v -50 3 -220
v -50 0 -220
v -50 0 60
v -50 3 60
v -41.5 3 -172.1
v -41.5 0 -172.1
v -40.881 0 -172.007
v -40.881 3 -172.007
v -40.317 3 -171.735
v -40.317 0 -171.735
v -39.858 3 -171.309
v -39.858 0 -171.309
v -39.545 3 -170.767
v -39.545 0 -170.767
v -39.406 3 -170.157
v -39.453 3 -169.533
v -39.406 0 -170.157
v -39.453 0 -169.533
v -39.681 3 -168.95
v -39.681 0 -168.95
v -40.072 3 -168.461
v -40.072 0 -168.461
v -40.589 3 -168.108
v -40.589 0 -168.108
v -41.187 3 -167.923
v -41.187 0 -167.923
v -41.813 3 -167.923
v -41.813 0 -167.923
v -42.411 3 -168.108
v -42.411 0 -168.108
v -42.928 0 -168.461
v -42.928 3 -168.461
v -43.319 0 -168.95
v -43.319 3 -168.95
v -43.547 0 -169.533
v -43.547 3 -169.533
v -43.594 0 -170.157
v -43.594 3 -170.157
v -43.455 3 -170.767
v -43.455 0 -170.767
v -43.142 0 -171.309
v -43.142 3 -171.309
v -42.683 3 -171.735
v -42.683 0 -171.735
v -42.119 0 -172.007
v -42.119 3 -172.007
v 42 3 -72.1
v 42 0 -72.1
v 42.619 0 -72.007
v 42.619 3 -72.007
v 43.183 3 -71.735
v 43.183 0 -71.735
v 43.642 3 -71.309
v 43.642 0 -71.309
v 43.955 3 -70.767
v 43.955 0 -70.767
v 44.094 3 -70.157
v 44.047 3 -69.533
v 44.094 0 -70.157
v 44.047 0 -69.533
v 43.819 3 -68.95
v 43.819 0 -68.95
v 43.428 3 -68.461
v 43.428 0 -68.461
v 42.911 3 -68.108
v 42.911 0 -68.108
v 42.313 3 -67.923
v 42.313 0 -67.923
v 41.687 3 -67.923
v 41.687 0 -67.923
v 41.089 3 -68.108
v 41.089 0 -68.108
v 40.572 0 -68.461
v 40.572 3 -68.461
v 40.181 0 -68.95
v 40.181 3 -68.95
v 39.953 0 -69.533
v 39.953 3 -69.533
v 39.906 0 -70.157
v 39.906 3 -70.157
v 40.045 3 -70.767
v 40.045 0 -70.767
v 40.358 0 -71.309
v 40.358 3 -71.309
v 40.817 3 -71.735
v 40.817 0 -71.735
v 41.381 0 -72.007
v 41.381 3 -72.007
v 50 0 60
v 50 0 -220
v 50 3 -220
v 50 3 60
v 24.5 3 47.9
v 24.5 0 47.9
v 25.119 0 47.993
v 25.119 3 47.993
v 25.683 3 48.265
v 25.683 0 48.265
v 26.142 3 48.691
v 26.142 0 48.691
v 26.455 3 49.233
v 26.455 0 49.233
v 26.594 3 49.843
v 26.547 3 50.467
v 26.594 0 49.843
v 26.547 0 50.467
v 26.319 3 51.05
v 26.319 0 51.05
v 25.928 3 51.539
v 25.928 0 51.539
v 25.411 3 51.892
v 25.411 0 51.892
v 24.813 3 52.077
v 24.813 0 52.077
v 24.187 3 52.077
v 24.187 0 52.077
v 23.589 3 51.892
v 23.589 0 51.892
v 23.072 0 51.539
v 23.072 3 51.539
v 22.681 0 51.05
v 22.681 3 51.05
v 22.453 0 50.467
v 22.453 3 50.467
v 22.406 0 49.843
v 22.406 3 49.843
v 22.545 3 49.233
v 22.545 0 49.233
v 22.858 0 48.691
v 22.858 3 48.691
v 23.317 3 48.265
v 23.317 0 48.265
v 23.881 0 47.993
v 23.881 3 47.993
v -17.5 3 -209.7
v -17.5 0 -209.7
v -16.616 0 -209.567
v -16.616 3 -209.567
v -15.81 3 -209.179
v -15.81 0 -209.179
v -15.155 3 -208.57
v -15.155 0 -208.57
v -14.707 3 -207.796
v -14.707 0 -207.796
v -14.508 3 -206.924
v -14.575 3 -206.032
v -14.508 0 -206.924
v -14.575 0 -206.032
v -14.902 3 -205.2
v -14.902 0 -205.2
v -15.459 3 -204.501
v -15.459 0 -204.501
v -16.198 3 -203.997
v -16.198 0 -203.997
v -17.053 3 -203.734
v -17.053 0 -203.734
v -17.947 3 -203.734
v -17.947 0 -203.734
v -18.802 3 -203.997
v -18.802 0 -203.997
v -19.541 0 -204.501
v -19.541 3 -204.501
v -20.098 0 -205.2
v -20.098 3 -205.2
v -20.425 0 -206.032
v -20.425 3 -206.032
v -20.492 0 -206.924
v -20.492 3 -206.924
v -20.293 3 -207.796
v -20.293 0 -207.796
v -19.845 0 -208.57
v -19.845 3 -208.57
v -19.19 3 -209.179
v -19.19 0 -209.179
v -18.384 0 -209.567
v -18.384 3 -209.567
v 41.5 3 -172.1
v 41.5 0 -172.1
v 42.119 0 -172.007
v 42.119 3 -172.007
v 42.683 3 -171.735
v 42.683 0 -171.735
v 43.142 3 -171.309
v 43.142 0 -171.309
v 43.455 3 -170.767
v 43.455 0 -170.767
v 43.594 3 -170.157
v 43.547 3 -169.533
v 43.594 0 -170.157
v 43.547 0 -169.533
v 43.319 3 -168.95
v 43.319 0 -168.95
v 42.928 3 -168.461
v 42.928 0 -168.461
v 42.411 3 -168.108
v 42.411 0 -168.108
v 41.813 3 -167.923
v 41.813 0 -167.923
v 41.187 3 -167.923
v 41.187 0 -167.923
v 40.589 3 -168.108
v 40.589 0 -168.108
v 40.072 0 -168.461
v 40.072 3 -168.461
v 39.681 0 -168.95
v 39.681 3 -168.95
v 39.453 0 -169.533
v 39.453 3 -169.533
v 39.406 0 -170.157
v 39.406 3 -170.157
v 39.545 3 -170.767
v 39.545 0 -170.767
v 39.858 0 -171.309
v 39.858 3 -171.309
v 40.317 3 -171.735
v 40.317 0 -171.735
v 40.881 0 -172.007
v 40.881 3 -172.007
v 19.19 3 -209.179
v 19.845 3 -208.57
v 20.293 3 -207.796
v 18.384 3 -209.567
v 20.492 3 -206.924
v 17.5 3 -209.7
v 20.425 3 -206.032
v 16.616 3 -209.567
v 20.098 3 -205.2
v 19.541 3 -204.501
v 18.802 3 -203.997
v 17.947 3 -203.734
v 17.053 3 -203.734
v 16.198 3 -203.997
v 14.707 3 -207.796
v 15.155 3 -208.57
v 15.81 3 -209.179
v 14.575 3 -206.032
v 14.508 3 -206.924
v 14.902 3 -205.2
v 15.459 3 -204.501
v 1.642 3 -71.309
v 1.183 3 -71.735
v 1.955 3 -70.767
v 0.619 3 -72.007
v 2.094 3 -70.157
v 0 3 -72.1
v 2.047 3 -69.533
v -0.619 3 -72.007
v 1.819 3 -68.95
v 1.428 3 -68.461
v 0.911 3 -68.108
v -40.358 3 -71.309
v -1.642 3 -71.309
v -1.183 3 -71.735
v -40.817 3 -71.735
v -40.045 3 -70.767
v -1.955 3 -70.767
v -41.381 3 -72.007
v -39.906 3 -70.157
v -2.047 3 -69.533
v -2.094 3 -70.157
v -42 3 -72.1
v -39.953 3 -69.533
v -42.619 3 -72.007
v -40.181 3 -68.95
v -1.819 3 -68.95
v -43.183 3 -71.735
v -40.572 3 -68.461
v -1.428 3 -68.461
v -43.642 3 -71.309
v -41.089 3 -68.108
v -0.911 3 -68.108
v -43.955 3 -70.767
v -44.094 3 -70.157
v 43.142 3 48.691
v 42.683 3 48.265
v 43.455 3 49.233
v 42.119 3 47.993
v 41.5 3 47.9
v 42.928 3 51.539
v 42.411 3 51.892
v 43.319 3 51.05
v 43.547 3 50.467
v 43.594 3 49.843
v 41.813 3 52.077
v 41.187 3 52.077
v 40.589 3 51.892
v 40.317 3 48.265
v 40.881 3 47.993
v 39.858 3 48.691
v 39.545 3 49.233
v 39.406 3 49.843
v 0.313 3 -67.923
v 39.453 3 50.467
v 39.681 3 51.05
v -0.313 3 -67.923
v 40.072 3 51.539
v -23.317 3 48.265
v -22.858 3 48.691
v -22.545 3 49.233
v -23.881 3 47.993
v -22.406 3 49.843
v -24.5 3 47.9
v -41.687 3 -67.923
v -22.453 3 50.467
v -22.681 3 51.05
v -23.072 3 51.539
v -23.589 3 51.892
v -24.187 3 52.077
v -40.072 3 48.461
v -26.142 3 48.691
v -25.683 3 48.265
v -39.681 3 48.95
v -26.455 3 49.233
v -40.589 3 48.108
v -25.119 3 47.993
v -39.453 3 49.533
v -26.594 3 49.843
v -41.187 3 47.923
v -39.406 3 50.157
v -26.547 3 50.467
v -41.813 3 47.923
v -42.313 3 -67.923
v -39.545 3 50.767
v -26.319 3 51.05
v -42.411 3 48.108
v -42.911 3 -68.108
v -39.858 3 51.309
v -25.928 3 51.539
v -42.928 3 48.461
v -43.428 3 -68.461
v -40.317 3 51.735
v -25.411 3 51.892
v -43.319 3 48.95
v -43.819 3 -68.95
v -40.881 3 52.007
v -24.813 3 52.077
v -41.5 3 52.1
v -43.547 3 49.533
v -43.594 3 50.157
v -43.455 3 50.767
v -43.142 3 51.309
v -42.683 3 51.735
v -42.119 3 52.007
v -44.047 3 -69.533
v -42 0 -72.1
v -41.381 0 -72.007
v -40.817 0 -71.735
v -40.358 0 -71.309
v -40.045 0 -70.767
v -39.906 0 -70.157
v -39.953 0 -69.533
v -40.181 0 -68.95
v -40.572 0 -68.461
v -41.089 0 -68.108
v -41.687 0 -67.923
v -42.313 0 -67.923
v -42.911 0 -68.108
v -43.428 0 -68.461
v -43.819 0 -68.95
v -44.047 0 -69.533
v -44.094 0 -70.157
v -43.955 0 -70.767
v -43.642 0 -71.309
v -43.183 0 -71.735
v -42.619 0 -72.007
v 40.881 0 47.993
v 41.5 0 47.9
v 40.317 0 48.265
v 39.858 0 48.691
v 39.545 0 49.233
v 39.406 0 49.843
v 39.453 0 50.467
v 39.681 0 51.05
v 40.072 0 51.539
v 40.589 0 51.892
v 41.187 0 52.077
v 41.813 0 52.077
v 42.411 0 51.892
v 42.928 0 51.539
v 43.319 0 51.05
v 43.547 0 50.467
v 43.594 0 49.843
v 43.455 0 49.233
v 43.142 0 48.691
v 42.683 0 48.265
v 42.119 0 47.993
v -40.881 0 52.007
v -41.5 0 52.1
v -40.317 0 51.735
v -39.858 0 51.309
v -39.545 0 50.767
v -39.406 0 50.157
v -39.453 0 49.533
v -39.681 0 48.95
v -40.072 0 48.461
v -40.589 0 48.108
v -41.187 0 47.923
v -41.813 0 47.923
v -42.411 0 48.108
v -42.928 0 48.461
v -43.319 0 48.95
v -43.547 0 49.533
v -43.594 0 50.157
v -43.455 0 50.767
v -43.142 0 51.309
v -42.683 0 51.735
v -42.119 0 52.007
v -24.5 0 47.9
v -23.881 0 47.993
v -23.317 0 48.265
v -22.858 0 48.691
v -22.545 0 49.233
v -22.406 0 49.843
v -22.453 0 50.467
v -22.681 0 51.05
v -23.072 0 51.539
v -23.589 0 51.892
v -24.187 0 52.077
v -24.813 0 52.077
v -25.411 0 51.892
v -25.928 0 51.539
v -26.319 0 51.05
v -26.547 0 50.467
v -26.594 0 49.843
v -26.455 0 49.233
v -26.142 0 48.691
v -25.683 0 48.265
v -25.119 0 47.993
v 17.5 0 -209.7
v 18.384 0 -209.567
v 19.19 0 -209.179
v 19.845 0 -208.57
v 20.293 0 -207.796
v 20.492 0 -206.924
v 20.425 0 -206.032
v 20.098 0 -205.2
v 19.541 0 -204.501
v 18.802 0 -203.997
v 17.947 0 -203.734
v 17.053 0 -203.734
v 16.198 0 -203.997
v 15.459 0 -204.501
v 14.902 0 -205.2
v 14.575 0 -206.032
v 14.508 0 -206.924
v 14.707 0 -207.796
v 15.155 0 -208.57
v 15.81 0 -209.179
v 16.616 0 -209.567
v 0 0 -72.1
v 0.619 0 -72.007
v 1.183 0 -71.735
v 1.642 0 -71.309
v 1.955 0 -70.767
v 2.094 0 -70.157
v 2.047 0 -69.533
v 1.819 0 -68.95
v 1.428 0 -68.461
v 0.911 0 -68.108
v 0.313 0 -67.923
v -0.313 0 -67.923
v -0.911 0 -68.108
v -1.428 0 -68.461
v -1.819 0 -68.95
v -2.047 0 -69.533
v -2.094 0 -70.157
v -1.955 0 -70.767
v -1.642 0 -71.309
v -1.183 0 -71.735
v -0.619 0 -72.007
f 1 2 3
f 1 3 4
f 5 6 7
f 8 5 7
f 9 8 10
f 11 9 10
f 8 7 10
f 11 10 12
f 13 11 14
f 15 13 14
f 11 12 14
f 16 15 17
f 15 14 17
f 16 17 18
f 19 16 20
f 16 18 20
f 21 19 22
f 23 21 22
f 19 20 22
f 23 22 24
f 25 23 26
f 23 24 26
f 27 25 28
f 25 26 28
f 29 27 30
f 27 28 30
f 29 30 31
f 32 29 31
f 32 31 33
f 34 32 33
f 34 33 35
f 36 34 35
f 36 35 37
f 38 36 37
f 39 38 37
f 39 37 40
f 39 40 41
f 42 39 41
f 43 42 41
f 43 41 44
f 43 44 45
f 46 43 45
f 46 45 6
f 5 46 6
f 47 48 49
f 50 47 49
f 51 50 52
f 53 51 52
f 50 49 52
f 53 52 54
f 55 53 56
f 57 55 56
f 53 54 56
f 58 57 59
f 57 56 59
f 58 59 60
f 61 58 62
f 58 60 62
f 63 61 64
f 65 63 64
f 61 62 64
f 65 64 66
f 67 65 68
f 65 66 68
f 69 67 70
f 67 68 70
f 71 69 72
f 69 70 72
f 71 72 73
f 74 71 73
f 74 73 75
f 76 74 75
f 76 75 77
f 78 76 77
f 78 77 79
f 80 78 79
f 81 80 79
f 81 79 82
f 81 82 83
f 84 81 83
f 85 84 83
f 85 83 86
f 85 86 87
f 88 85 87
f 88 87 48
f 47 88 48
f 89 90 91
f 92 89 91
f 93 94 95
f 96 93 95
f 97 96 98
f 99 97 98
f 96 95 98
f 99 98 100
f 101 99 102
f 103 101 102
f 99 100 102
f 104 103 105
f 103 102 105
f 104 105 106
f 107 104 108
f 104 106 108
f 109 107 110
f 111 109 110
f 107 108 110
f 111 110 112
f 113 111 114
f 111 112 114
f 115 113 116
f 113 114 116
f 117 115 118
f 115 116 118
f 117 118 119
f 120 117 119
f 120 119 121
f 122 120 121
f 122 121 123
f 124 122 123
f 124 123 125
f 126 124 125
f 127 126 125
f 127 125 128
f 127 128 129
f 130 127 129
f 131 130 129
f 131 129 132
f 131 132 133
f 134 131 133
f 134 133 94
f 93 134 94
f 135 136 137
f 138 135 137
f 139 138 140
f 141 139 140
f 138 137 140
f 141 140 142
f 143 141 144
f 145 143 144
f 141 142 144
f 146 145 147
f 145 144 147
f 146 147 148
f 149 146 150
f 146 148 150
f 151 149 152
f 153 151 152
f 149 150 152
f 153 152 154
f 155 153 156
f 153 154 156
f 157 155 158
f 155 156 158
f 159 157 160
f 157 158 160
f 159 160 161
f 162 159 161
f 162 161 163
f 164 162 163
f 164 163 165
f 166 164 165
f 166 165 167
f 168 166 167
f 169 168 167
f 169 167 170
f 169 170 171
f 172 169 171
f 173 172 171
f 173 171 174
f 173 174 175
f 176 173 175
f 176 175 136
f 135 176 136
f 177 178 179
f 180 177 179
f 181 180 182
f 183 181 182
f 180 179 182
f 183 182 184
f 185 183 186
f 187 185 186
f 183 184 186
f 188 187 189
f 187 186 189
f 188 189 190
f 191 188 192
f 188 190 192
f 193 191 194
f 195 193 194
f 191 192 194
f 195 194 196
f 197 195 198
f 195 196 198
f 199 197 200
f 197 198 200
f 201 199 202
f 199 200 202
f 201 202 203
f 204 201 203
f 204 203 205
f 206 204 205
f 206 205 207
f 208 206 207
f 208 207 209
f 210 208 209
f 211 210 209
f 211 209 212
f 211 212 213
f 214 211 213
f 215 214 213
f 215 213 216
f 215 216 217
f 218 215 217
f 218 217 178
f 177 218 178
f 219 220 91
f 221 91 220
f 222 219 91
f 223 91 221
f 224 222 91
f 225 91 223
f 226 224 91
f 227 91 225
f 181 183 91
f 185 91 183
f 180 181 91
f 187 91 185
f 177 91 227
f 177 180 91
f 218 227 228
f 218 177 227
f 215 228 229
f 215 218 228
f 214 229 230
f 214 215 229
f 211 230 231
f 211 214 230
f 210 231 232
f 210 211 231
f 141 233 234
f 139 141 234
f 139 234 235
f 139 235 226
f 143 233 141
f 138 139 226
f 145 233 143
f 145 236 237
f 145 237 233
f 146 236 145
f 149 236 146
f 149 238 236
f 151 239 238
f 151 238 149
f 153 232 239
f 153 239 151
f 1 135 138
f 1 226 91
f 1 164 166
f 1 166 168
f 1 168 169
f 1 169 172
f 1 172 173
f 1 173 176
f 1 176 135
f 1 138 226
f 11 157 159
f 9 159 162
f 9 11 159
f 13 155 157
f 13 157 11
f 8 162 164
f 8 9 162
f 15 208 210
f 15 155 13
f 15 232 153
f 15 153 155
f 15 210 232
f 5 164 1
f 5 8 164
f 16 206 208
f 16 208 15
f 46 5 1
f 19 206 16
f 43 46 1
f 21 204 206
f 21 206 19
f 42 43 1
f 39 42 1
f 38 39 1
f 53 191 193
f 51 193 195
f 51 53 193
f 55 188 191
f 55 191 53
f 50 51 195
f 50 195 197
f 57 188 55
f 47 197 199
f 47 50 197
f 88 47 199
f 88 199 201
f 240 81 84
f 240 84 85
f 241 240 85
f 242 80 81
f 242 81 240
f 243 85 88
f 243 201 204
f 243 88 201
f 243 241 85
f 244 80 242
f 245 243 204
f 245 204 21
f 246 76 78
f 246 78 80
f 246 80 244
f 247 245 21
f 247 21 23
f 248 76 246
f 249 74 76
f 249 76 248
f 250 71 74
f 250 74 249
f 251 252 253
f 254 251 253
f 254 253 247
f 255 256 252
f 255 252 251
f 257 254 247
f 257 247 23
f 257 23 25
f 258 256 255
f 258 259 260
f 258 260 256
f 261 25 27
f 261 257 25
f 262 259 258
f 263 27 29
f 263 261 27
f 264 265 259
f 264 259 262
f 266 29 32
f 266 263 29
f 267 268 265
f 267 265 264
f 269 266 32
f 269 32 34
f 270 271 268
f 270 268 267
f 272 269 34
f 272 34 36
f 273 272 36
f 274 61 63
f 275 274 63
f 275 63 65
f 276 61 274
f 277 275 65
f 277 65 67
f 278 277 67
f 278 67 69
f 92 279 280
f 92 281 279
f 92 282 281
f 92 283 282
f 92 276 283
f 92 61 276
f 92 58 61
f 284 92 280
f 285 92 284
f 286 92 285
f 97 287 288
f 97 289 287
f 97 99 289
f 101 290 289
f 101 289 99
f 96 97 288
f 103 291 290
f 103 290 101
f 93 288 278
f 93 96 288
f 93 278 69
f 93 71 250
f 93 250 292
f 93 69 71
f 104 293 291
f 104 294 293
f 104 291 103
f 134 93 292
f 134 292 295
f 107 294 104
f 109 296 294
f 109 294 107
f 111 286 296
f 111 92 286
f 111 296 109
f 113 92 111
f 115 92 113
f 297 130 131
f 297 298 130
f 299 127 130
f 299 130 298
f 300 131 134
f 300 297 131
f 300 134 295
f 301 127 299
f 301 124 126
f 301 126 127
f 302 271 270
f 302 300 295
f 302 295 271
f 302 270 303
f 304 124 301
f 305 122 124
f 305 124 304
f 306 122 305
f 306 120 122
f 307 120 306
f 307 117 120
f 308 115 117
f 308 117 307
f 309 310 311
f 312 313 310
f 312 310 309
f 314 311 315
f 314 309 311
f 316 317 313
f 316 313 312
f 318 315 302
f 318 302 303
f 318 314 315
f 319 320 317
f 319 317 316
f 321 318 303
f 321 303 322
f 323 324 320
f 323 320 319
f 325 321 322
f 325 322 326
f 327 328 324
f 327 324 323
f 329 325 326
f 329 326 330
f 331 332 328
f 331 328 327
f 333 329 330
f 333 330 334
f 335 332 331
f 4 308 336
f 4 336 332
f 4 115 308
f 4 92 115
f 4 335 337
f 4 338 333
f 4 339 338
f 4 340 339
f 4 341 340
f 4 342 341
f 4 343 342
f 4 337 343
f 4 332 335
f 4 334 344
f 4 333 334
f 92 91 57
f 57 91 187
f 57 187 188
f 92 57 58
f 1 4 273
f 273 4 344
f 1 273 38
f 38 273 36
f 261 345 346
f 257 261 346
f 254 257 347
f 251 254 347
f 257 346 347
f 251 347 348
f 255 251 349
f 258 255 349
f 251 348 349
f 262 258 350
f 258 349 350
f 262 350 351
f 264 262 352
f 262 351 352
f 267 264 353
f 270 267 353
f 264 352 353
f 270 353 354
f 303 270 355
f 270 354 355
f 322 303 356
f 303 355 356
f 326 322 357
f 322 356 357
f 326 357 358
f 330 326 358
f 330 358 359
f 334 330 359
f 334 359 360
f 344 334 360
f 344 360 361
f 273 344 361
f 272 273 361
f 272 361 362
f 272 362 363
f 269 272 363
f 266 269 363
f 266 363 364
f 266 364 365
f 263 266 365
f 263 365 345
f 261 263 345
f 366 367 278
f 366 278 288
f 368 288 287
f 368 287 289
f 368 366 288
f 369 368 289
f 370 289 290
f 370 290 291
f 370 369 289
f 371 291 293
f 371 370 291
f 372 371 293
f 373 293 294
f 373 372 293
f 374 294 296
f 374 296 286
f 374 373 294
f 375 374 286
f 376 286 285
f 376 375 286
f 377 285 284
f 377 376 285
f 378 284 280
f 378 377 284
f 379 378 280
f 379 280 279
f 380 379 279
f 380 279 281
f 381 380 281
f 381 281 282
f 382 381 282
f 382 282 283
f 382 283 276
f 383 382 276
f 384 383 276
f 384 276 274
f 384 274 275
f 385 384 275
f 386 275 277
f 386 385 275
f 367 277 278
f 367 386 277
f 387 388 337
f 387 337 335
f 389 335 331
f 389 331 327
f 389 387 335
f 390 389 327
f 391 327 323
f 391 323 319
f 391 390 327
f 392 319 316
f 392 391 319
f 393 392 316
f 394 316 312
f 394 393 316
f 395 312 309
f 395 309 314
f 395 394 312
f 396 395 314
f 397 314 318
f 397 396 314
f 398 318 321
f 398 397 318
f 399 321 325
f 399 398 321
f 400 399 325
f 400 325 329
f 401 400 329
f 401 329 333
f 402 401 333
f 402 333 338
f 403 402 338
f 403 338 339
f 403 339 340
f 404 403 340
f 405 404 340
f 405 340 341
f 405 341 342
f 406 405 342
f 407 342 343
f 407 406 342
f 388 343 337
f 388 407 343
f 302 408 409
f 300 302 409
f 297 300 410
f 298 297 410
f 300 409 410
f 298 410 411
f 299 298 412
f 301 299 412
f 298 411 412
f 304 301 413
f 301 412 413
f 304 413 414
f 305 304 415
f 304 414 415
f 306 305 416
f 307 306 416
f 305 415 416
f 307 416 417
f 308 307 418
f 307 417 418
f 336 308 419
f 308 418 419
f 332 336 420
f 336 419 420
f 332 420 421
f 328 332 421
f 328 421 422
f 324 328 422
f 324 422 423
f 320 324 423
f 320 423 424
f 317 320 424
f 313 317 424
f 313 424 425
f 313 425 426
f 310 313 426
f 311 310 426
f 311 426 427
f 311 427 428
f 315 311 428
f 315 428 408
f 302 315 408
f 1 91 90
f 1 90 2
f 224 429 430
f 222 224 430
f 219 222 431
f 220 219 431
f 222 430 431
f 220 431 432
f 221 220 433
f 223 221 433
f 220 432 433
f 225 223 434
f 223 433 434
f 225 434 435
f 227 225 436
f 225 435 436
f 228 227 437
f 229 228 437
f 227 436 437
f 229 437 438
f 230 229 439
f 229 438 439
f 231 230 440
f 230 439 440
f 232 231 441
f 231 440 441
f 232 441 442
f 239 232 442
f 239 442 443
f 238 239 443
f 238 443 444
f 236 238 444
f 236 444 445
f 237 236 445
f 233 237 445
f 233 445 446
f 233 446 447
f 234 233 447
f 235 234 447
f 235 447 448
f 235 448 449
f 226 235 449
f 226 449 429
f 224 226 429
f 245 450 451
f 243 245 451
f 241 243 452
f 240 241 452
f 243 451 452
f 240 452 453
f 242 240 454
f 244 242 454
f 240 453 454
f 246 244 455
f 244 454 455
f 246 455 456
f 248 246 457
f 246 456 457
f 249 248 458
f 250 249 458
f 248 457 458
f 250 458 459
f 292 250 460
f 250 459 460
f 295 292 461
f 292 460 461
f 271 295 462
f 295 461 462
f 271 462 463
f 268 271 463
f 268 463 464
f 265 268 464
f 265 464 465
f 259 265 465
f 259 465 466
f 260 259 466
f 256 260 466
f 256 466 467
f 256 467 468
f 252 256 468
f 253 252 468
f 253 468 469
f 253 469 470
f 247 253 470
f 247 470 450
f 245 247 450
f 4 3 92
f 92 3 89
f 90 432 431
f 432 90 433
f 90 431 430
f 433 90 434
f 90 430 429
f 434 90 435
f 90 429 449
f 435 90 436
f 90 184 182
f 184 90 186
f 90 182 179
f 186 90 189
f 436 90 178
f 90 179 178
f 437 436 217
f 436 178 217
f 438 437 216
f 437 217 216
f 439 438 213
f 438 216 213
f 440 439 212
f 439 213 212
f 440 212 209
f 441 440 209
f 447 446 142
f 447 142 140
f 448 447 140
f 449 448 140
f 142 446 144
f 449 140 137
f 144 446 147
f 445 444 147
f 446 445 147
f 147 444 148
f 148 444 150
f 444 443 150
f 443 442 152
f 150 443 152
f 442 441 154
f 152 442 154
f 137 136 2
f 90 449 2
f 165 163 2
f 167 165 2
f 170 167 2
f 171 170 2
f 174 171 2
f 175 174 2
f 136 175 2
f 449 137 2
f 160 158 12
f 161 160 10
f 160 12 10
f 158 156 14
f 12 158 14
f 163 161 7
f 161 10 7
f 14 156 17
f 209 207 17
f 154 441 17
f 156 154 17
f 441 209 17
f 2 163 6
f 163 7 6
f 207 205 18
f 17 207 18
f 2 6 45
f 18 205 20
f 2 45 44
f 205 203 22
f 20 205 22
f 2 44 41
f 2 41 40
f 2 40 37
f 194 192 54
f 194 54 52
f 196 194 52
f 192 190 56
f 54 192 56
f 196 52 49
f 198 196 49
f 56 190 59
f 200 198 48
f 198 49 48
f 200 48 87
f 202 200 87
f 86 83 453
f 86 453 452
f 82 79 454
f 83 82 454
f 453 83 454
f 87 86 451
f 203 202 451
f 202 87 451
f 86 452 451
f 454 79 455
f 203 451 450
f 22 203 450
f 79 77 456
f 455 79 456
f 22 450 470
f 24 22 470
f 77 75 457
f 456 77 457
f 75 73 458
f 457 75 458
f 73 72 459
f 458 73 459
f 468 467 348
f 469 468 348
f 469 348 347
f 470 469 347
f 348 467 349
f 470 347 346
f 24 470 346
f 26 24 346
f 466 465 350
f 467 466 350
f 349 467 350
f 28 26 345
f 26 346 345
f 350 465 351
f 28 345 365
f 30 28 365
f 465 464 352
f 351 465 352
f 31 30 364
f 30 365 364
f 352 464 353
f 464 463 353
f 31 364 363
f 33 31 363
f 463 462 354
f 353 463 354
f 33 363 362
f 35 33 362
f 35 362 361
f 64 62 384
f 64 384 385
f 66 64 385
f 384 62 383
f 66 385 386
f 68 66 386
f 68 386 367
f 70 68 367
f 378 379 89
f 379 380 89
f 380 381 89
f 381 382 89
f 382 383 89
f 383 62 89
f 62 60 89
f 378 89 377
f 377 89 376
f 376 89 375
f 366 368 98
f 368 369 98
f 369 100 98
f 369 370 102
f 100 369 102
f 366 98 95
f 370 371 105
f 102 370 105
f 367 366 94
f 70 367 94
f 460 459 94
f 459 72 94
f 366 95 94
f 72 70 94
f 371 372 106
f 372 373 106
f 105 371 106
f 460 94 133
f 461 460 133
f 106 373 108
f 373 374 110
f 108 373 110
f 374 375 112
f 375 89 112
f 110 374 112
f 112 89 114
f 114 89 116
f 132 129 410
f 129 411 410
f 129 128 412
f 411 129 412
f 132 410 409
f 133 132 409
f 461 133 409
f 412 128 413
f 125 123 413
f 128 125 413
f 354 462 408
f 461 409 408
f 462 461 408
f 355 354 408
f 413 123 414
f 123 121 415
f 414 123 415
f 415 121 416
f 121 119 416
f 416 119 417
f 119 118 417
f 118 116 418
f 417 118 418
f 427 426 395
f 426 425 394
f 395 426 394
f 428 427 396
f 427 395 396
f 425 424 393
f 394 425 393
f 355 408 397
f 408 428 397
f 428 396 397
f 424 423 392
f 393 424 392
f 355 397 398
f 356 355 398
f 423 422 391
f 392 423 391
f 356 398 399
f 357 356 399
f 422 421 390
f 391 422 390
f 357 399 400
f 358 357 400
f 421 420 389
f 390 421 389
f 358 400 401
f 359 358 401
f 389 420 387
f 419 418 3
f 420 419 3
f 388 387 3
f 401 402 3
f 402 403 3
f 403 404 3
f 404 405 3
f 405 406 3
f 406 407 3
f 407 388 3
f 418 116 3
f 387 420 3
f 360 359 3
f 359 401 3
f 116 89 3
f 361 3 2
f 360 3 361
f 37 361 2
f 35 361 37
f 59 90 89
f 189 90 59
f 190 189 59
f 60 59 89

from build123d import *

# Parameters (mm, degrees)
SKETCH1_R             = 2.1
BOSS_EXTRUDE1_DEPTH   = 3
BOSS_EXTRUDE1_2_DEPTH = 3
BOSS_EXTRUDE1_3_DEPTH = 3
SKETCH1_W             = 100
SKETCH1_H             = 120
BOSS_EXTRUDE1_4_DEPTH = 3
SKETCH2_R             = 2.1
CUT_EXTRUDE1_DEPTH    = 10
SKETCH3_W             = 100
SKETCH3_H             = 3
BOSS_EXTRUDE2_DEPTH   = 160
SKETCH4_R             = 3
SKETCH4_R_2           = 2.1
CUT_EXTRUDE2_DEPTH    = 160
SKETCH5_R             = 2.1
CUT_EXTRUDE3_DEPTH    = 10


with BuildPart() as part:
    # Sketch1 → Boss-Extrude1 (new body)
    with BuildSketch(Plane(origin=(0, 0, 0), x_dir=(1, 0, 0), z_dir=(0, 1, 0))):
        with Locations(Location((-42, 70, 0), (0, 0, 270))):
            Circle(SKETCH1_R)
    extrude(amount=BOSS_EXTRUDE1_DEPTH)


with BuildPart() as body_2:
    # Sketch1 → Boss-Extrude1 2 (new body)
    with BuildSketch(Plane(origin=(0, 0, 0), x_dir=(1, 0, 0), z_dir=(0, 1, 0))):
        with Locations(Location((0, 70, 0), (0, 0, 270))):
            Circle(SKETCH1_R)
    extrude(amount=BOSS_EXTRUDE1_2_DEPTH)


with BuildPart() as body_3:
    # Sketch1 → Boss-Extrude1 3 (new body)
    with BuildSketch(Plane(origin=(0, 0, 0), x_dir=(1, 0, 0), z_dir=(0, 1, 0))):
        with Locations(Location((42, 70, 0), (0, 0, 270))):
            Circle(SKETCH1_R)
    extrude(amount=BOSS_EXTRUDE1_3_DEPTH)


with BuildPart() as body_4:
    # Sketch1 → Boss-Extrude1 4 (new body)
    with BuildSketch(Plane(origin=(0, 0, 0), x_dir=(1, 0, 0), z_dir=(0, 1, 0))):
        Rectangle(SKETCH1_W, SKETCH1_H)
        with Locations(Location((41.5, -50, 0), (0, 0, 90))):
            Circle(SKETCH1_R, mode=Mode.SUBTRACT)
        with Locations(Location((-41.5, -50, 0), (0, 0, 270))):
            Circle(SKETCH1_R, mode=Mode.SUBTRACT)
    extrude(amount=BOSS_EXTRUDE1_4_DEPTH)

    # Sketch2 → Cut-Extrude1 (cut)
    with BuildSketch(Plane.XZ):
        with Locations(Location((24.5, 50, 0), (0, 0, 270))):
            Circle(SKETCH2_R)
        with Locations(Location((-24.5, 50, 0), (0, 0, 270))):
            Circle(SKETCH2_R)
    extrude(amount=-CUT_EXTRUDE1_DEPTH, mode=Mode.SUBTRACT)

    # Sketch3 → Boss-Extrude2 (add)
    with BuildSketch(Plane(origin=(0, 0, -60), x_dir=(-1, 0, 0), z_dir=(0, 0, -1))):
        with Locations((0, 1.5)):
            Rectangle(SKETCH3_W, SKETCH3_H)
    extrude(amount=BOSS_EXTRUDE2_DEPTH)

    # Sketch4 → Cut-Extrude2 (cut)
    with BuildSketch(Plane.XZ):
        with Locations(Location((17.5, -206.7, 0), (0, 0, 270))):
            Circle(SKETCH4_R)
        with Locations(Location((-17.5, -206.7, 0), (0, 0, 270))):
            Circle(SKETCH4_R)
        with Locations(Location((-41.5, -170, 0), (0, 0, 270))):
            Circle(SKETCH4_R_2)
        with Locations(Location((41.5, -170, 0), (0, 0, 270))):
            Circle(SKETCH4_R_2)
    extrude(amount=-CUT_EXTRUDE2_DEPTH, mode=Mode.SUBTRACT)


with BuildPart() as cut_extrude3_tool:
    # Sketch5 → Cut-Extrude3 (new body)
    with BuildSketch(Plane.XZ):
        with Locations(Location((-42, -70, 0), (0, 0, 270))):
            Circle(SKETCH5_R)
        with Locations(Location((0, -70, 0), (0, 0, 270))):
            Circle(SKETCH5_R)
        with Locations(Location((42, -70, 0), (0, 0, 270))):
            Circle(SKETCH5_R)
    extrude(amount=-CUT_EXTRUDE3_DEPTH)


with BuildPart() as part_1:
    add(part.part)

    # Cut-Extrude3: cut by cut_extrude3_tool
    add(cut_extrude3_tool.part, mode=Mode.SUBTRACT)


with BuildPart() as body_2_1:
    add(body_2.part)

    # Cut-Extrude3: cut by cut_extrude3_tool
    add(cut_extrude3_tool.part, mode=Mode.SUBTRACT)


with BuildPart() as body_3_1:
    add(body_3.part)

    # Cut-Extrude3: cut by cut_extrude3_tool
    add(cut_extrude3_tool.part, mode=Mode.SUBTRACT)


with BuildPart() as body_4_1:
    add(body_4.part)

    # Cut-Extrude3: cut by cut_extrude3_tool
    add(cut_extrude3_tool.part, mode=Mode.SUBTRACT)


solid = body_4_1.part
